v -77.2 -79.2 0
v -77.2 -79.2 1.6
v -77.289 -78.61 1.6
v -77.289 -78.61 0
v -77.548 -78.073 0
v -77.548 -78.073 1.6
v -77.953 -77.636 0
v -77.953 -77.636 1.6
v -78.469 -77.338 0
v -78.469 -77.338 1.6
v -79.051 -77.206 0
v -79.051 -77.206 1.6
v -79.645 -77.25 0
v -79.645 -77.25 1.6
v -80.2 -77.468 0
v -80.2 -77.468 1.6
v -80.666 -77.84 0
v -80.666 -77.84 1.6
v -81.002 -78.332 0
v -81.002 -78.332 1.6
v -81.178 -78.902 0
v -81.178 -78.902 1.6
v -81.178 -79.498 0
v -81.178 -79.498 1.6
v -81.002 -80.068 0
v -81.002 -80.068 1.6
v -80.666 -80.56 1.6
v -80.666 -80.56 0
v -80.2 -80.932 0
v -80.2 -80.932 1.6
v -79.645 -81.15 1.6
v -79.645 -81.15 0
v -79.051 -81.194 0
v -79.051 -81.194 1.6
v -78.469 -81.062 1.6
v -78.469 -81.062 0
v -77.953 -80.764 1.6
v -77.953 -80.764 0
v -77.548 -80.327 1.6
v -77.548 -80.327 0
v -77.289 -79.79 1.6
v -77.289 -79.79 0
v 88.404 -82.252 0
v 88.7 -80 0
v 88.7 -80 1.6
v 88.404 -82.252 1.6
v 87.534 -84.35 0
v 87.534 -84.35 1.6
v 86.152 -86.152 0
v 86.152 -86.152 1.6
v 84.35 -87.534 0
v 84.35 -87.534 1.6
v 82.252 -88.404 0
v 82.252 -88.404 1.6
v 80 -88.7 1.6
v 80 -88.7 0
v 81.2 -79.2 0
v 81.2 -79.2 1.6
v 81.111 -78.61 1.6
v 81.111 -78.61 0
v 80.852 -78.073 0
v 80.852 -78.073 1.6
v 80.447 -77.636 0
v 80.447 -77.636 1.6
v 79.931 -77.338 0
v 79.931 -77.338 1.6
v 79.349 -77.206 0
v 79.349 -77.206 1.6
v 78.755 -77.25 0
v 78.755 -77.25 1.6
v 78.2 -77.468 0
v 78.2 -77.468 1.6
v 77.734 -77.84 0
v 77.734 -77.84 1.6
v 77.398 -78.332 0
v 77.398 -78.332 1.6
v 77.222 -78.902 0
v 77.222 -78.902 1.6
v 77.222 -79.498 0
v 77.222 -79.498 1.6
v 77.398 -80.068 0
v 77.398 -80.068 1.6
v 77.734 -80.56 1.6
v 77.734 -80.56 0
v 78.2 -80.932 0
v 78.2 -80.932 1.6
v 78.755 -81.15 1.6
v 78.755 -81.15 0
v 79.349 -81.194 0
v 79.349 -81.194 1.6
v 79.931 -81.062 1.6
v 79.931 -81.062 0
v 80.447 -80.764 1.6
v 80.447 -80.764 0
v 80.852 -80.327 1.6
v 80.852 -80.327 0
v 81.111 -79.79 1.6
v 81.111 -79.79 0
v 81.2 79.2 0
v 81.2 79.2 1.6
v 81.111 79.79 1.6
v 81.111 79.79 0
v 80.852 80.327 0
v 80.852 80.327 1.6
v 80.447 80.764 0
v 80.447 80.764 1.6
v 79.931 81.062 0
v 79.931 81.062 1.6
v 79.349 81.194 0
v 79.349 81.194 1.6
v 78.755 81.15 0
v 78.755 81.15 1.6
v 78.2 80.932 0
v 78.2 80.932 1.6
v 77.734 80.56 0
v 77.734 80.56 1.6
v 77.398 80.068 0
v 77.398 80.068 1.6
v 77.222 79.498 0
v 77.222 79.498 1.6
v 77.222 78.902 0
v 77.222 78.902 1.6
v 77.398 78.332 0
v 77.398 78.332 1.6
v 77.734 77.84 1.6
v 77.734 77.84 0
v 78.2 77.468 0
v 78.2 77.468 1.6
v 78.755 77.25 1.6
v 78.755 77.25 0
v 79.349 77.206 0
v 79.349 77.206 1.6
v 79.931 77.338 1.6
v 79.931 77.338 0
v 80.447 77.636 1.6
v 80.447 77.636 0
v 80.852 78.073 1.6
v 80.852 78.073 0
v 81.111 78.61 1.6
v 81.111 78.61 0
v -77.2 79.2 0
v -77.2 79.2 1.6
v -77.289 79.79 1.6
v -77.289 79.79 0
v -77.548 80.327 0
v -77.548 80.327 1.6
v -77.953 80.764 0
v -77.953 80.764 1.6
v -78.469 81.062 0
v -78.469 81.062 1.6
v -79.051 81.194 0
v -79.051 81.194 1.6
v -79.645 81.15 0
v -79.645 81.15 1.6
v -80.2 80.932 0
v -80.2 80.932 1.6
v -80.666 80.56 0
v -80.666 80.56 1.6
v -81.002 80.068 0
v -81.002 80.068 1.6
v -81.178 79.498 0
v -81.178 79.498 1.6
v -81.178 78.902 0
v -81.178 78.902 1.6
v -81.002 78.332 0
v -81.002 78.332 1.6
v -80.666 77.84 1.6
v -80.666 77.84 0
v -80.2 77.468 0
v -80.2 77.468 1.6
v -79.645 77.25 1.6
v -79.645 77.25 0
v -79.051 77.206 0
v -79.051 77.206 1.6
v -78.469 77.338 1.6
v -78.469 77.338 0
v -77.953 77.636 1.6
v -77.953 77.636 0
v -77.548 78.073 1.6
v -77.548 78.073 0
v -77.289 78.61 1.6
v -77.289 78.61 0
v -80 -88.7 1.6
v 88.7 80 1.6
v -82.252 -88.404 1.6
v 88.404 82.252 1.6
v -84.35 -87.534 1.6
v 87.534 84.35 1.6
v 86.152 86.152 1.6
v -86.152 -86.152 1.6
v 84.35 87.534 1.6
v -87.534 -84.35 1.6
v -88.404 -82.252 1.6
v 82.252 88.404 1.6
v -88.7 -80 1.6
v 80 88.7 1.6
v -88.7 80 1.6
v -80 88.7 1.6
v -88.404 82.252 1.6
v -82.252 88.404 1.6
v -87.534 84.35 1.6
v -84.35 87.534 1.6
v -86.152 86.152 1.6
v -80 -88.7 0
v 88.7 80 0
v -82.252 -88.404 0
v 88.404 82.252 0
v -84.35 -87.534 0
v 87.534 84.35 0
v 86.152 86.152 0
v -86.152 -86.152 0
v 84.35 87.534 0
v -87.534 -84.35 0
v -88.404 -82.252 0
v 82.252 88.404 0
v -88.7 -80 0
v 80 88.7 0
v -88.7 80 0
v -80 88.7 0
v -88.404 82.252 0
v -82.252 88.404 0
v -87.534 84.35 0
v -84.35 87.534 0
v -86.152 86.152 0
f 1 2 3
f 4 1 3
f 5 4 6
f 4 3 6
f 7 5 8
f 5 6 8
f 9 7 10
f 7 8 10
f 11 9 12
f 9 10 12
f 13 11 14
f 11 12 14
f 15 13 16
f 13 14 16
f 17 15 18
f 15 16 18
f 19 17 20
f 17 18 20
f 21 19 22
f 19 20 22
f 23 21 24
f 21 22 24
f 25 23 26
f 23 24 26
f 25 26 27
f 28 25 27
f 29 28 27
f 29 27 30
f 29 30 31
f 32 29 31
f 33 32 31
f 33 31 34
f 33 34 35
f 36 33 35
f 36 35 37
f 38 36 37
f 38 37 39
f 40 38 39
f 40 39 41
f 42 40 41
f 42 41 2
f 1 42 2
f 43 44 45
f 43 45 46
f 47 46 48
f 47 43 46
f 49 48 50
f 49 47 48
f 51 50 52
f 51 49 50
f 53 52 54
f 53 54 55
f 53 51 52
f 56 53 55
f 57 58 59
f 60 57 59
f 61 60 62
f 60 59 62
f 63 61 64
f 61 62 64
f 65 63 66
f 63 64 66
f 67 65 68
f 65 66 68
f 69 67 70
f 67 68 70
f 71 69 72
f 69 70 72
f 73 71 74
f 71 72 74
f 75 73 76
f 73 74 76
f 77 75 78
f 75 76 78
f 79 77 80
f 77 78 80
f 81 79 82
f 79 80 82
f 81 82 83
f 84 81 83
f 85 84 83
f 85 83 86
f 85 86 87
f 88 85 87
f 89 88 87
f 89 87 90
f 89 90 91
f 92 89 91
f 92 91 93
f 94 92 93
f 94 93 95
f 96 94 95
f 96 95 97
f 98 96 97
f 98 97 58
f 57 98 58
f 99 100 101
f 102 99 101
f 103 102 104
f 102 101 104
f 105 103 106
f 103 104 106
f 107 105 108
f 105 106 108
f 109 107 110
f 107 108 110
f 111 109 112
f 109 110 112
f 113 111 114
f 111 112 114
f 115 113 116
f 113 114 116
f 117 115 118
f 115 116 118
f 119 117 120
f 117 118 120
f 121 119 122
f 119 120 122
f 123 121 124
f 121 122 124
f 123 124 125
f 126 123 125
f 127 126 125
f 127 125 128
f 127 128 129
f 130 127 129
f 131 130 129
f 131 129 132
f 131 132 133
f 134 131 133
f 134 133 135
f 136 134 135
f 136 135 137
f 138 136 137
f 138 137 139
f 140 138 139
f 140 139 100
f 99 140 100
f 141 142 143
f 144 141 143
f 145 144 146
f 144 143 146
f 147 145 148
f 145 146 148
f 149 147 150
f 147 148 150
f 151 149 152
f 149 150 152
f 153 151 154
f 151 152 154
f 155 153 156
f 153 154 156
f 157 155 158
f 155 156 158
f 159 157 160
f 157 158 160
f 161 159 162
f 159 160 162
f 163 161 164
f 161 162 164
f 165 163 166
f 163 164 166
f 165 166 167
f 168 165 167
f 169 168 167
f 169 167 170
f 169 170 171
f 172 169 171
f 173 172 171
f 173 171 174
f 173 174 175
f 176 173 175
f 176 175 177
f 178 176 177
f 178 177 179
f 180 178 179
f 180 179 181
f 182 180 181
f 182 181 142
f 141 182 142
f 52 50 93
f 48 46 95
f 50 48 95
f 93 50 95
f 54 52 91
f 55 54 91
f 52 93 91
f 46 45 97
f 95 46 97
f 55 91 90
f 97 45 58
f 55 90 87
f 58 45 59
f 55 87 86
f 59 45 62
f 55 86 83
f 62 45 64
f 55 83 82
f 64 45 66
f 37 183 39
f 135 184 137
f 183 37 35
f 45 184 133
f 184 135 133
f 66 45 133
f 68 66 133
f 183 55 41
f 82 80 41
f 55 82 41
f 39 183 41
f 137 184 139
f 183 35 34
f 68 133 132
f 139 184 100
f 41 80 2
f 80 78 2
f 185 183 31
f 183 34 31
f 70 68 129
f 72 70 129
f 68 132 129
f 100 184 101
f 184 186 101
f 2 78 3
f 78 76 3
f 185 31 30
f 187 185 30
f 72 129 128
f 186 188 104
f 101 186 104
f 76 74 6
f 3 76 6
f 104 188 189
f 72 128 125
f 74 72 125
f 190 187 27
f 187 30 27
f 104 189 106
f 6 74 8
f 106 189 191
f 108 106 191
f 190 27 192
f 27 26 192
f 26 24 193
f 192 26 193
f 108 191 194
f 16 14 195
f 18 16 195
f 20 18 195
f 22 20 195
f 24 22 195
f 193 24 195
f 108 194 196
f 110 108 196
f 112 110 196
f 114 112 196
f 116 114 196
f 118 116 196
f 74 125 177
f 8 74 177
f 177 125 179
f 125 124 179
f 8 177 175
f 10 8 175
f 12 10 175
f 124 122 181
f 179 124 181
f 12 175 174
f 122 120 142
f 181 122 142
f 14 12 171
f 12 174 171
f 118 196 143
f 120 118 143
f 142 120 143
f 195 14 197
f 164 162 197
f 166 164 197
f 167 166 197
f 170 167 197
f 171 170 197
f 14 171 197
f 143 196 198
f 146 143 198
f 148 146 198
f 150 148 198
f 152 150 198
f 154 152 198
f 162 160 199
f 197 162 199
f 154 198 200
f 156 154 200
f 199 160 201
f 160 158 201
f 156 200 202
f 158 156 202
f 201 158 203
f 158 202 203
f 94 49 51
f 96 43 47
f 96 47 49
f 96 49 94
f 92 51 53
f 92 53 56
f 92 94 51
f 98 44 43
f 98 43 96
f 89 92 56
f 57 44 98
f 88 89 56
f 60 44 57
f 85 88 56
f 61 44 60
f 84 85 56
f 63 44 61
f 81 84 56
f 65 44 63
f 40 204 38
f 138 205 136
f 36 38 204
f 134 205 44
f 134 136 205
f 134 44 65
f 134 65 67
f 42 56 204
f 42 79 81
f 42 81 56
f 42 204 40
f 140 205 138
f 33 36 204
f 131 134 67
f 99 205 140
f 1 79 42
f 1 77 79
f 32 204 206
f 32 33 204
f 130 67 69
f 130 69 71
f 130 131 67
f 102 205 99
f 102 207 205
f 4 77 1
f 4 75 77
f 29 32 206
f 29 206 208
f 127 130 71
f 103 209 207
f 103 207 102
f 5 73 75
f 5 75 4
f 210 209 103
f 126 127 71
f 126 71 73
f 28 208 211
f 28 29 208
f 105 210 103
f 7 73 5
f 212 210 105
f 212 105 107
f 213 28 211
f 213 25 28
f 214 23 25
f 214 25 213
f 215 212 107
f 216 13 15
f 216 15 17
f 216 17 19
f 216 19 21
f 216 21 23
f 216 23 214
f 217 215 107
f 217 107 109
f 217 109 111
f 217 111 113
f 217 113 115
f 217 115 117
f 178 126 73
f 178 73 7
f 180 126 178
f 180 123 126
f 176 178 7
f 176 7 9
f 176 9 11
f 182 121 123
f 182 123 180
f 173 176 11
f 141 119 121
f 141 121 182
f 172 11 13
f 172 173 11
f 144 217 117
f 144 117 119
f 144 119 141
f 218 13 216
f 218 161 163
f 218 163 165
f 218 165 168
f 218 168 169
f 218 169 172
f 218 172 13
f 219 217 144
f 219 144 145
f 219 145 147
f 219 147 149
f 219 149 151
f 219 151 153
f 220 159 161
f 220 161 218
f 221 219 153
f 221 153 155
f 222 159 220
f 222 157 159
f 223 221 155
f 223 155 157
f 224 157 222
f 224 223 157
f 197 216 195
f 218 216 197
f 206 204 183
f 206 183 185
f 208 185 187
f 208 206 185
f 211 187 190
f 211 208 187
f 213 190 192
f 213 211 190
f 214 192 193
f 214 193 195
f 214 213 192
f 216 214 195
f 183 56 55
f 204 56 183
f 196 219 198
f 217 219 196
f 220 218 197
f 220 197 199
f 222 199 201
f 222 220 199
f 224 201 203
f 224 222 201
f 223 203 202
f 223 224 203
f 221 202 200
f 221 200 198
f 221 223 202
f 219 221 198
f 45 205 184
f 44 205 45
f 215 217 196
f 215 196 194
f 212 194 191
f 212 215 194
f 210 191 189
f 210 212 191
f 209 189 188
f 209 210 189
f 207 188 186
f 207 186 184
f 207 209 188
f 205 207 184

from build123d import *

# Parameters (mm, degrees)
BOSS_EXTRUDE1_DEPTH      = 1.6
F_4_0_4_DIAMETER_HOLE1_D = 4


with BuildPart() as part:
    # Sketch1 → Boss-Extrude1 (new body)
    with BuildSketch(Plane.XY):
        with BuildLine():
            Line((-80, 88.7), (80, 88.7))
            ThreePointArc((80, 88.7), (86.151828996, 86.151828996), (88.7, 80))
            Line((88.7, 80), (88.7, -80))
            ThreePointArc((88.7, -80), (86.151828996, -86.151828996), (80, -88.7))
            Line((80, -88.7), (-80, -88.7))
            ThreePointArc((-80, -88.7), (-86.151828996, -86.151828996), (-88.7, -80))
            Line((-88.7, -80), (-88.7, 80))
            ThreePointArc((-88.7, 80), (-86.151828996, 86.151828996), (-80, 88.7))
        make_face()
    extrude(amount=BOSS_EXTRUDE1_DEPTH)

    # Ø4.0 (4) Diameter Hole1 (through all)
    with Locations(Plane(origin=(0, 0, 0), x_dir=(-1, 0, 0), z_dir=(0, 0, -1))):
        with Locations((-79.2, 79.2), (79.2, 79.2), (-79.2, -79.2), (79.2, -79.2)):
            Hole(F_4_0_4_DIAMETER_HOLE1_D / 2)


solid = part.part
